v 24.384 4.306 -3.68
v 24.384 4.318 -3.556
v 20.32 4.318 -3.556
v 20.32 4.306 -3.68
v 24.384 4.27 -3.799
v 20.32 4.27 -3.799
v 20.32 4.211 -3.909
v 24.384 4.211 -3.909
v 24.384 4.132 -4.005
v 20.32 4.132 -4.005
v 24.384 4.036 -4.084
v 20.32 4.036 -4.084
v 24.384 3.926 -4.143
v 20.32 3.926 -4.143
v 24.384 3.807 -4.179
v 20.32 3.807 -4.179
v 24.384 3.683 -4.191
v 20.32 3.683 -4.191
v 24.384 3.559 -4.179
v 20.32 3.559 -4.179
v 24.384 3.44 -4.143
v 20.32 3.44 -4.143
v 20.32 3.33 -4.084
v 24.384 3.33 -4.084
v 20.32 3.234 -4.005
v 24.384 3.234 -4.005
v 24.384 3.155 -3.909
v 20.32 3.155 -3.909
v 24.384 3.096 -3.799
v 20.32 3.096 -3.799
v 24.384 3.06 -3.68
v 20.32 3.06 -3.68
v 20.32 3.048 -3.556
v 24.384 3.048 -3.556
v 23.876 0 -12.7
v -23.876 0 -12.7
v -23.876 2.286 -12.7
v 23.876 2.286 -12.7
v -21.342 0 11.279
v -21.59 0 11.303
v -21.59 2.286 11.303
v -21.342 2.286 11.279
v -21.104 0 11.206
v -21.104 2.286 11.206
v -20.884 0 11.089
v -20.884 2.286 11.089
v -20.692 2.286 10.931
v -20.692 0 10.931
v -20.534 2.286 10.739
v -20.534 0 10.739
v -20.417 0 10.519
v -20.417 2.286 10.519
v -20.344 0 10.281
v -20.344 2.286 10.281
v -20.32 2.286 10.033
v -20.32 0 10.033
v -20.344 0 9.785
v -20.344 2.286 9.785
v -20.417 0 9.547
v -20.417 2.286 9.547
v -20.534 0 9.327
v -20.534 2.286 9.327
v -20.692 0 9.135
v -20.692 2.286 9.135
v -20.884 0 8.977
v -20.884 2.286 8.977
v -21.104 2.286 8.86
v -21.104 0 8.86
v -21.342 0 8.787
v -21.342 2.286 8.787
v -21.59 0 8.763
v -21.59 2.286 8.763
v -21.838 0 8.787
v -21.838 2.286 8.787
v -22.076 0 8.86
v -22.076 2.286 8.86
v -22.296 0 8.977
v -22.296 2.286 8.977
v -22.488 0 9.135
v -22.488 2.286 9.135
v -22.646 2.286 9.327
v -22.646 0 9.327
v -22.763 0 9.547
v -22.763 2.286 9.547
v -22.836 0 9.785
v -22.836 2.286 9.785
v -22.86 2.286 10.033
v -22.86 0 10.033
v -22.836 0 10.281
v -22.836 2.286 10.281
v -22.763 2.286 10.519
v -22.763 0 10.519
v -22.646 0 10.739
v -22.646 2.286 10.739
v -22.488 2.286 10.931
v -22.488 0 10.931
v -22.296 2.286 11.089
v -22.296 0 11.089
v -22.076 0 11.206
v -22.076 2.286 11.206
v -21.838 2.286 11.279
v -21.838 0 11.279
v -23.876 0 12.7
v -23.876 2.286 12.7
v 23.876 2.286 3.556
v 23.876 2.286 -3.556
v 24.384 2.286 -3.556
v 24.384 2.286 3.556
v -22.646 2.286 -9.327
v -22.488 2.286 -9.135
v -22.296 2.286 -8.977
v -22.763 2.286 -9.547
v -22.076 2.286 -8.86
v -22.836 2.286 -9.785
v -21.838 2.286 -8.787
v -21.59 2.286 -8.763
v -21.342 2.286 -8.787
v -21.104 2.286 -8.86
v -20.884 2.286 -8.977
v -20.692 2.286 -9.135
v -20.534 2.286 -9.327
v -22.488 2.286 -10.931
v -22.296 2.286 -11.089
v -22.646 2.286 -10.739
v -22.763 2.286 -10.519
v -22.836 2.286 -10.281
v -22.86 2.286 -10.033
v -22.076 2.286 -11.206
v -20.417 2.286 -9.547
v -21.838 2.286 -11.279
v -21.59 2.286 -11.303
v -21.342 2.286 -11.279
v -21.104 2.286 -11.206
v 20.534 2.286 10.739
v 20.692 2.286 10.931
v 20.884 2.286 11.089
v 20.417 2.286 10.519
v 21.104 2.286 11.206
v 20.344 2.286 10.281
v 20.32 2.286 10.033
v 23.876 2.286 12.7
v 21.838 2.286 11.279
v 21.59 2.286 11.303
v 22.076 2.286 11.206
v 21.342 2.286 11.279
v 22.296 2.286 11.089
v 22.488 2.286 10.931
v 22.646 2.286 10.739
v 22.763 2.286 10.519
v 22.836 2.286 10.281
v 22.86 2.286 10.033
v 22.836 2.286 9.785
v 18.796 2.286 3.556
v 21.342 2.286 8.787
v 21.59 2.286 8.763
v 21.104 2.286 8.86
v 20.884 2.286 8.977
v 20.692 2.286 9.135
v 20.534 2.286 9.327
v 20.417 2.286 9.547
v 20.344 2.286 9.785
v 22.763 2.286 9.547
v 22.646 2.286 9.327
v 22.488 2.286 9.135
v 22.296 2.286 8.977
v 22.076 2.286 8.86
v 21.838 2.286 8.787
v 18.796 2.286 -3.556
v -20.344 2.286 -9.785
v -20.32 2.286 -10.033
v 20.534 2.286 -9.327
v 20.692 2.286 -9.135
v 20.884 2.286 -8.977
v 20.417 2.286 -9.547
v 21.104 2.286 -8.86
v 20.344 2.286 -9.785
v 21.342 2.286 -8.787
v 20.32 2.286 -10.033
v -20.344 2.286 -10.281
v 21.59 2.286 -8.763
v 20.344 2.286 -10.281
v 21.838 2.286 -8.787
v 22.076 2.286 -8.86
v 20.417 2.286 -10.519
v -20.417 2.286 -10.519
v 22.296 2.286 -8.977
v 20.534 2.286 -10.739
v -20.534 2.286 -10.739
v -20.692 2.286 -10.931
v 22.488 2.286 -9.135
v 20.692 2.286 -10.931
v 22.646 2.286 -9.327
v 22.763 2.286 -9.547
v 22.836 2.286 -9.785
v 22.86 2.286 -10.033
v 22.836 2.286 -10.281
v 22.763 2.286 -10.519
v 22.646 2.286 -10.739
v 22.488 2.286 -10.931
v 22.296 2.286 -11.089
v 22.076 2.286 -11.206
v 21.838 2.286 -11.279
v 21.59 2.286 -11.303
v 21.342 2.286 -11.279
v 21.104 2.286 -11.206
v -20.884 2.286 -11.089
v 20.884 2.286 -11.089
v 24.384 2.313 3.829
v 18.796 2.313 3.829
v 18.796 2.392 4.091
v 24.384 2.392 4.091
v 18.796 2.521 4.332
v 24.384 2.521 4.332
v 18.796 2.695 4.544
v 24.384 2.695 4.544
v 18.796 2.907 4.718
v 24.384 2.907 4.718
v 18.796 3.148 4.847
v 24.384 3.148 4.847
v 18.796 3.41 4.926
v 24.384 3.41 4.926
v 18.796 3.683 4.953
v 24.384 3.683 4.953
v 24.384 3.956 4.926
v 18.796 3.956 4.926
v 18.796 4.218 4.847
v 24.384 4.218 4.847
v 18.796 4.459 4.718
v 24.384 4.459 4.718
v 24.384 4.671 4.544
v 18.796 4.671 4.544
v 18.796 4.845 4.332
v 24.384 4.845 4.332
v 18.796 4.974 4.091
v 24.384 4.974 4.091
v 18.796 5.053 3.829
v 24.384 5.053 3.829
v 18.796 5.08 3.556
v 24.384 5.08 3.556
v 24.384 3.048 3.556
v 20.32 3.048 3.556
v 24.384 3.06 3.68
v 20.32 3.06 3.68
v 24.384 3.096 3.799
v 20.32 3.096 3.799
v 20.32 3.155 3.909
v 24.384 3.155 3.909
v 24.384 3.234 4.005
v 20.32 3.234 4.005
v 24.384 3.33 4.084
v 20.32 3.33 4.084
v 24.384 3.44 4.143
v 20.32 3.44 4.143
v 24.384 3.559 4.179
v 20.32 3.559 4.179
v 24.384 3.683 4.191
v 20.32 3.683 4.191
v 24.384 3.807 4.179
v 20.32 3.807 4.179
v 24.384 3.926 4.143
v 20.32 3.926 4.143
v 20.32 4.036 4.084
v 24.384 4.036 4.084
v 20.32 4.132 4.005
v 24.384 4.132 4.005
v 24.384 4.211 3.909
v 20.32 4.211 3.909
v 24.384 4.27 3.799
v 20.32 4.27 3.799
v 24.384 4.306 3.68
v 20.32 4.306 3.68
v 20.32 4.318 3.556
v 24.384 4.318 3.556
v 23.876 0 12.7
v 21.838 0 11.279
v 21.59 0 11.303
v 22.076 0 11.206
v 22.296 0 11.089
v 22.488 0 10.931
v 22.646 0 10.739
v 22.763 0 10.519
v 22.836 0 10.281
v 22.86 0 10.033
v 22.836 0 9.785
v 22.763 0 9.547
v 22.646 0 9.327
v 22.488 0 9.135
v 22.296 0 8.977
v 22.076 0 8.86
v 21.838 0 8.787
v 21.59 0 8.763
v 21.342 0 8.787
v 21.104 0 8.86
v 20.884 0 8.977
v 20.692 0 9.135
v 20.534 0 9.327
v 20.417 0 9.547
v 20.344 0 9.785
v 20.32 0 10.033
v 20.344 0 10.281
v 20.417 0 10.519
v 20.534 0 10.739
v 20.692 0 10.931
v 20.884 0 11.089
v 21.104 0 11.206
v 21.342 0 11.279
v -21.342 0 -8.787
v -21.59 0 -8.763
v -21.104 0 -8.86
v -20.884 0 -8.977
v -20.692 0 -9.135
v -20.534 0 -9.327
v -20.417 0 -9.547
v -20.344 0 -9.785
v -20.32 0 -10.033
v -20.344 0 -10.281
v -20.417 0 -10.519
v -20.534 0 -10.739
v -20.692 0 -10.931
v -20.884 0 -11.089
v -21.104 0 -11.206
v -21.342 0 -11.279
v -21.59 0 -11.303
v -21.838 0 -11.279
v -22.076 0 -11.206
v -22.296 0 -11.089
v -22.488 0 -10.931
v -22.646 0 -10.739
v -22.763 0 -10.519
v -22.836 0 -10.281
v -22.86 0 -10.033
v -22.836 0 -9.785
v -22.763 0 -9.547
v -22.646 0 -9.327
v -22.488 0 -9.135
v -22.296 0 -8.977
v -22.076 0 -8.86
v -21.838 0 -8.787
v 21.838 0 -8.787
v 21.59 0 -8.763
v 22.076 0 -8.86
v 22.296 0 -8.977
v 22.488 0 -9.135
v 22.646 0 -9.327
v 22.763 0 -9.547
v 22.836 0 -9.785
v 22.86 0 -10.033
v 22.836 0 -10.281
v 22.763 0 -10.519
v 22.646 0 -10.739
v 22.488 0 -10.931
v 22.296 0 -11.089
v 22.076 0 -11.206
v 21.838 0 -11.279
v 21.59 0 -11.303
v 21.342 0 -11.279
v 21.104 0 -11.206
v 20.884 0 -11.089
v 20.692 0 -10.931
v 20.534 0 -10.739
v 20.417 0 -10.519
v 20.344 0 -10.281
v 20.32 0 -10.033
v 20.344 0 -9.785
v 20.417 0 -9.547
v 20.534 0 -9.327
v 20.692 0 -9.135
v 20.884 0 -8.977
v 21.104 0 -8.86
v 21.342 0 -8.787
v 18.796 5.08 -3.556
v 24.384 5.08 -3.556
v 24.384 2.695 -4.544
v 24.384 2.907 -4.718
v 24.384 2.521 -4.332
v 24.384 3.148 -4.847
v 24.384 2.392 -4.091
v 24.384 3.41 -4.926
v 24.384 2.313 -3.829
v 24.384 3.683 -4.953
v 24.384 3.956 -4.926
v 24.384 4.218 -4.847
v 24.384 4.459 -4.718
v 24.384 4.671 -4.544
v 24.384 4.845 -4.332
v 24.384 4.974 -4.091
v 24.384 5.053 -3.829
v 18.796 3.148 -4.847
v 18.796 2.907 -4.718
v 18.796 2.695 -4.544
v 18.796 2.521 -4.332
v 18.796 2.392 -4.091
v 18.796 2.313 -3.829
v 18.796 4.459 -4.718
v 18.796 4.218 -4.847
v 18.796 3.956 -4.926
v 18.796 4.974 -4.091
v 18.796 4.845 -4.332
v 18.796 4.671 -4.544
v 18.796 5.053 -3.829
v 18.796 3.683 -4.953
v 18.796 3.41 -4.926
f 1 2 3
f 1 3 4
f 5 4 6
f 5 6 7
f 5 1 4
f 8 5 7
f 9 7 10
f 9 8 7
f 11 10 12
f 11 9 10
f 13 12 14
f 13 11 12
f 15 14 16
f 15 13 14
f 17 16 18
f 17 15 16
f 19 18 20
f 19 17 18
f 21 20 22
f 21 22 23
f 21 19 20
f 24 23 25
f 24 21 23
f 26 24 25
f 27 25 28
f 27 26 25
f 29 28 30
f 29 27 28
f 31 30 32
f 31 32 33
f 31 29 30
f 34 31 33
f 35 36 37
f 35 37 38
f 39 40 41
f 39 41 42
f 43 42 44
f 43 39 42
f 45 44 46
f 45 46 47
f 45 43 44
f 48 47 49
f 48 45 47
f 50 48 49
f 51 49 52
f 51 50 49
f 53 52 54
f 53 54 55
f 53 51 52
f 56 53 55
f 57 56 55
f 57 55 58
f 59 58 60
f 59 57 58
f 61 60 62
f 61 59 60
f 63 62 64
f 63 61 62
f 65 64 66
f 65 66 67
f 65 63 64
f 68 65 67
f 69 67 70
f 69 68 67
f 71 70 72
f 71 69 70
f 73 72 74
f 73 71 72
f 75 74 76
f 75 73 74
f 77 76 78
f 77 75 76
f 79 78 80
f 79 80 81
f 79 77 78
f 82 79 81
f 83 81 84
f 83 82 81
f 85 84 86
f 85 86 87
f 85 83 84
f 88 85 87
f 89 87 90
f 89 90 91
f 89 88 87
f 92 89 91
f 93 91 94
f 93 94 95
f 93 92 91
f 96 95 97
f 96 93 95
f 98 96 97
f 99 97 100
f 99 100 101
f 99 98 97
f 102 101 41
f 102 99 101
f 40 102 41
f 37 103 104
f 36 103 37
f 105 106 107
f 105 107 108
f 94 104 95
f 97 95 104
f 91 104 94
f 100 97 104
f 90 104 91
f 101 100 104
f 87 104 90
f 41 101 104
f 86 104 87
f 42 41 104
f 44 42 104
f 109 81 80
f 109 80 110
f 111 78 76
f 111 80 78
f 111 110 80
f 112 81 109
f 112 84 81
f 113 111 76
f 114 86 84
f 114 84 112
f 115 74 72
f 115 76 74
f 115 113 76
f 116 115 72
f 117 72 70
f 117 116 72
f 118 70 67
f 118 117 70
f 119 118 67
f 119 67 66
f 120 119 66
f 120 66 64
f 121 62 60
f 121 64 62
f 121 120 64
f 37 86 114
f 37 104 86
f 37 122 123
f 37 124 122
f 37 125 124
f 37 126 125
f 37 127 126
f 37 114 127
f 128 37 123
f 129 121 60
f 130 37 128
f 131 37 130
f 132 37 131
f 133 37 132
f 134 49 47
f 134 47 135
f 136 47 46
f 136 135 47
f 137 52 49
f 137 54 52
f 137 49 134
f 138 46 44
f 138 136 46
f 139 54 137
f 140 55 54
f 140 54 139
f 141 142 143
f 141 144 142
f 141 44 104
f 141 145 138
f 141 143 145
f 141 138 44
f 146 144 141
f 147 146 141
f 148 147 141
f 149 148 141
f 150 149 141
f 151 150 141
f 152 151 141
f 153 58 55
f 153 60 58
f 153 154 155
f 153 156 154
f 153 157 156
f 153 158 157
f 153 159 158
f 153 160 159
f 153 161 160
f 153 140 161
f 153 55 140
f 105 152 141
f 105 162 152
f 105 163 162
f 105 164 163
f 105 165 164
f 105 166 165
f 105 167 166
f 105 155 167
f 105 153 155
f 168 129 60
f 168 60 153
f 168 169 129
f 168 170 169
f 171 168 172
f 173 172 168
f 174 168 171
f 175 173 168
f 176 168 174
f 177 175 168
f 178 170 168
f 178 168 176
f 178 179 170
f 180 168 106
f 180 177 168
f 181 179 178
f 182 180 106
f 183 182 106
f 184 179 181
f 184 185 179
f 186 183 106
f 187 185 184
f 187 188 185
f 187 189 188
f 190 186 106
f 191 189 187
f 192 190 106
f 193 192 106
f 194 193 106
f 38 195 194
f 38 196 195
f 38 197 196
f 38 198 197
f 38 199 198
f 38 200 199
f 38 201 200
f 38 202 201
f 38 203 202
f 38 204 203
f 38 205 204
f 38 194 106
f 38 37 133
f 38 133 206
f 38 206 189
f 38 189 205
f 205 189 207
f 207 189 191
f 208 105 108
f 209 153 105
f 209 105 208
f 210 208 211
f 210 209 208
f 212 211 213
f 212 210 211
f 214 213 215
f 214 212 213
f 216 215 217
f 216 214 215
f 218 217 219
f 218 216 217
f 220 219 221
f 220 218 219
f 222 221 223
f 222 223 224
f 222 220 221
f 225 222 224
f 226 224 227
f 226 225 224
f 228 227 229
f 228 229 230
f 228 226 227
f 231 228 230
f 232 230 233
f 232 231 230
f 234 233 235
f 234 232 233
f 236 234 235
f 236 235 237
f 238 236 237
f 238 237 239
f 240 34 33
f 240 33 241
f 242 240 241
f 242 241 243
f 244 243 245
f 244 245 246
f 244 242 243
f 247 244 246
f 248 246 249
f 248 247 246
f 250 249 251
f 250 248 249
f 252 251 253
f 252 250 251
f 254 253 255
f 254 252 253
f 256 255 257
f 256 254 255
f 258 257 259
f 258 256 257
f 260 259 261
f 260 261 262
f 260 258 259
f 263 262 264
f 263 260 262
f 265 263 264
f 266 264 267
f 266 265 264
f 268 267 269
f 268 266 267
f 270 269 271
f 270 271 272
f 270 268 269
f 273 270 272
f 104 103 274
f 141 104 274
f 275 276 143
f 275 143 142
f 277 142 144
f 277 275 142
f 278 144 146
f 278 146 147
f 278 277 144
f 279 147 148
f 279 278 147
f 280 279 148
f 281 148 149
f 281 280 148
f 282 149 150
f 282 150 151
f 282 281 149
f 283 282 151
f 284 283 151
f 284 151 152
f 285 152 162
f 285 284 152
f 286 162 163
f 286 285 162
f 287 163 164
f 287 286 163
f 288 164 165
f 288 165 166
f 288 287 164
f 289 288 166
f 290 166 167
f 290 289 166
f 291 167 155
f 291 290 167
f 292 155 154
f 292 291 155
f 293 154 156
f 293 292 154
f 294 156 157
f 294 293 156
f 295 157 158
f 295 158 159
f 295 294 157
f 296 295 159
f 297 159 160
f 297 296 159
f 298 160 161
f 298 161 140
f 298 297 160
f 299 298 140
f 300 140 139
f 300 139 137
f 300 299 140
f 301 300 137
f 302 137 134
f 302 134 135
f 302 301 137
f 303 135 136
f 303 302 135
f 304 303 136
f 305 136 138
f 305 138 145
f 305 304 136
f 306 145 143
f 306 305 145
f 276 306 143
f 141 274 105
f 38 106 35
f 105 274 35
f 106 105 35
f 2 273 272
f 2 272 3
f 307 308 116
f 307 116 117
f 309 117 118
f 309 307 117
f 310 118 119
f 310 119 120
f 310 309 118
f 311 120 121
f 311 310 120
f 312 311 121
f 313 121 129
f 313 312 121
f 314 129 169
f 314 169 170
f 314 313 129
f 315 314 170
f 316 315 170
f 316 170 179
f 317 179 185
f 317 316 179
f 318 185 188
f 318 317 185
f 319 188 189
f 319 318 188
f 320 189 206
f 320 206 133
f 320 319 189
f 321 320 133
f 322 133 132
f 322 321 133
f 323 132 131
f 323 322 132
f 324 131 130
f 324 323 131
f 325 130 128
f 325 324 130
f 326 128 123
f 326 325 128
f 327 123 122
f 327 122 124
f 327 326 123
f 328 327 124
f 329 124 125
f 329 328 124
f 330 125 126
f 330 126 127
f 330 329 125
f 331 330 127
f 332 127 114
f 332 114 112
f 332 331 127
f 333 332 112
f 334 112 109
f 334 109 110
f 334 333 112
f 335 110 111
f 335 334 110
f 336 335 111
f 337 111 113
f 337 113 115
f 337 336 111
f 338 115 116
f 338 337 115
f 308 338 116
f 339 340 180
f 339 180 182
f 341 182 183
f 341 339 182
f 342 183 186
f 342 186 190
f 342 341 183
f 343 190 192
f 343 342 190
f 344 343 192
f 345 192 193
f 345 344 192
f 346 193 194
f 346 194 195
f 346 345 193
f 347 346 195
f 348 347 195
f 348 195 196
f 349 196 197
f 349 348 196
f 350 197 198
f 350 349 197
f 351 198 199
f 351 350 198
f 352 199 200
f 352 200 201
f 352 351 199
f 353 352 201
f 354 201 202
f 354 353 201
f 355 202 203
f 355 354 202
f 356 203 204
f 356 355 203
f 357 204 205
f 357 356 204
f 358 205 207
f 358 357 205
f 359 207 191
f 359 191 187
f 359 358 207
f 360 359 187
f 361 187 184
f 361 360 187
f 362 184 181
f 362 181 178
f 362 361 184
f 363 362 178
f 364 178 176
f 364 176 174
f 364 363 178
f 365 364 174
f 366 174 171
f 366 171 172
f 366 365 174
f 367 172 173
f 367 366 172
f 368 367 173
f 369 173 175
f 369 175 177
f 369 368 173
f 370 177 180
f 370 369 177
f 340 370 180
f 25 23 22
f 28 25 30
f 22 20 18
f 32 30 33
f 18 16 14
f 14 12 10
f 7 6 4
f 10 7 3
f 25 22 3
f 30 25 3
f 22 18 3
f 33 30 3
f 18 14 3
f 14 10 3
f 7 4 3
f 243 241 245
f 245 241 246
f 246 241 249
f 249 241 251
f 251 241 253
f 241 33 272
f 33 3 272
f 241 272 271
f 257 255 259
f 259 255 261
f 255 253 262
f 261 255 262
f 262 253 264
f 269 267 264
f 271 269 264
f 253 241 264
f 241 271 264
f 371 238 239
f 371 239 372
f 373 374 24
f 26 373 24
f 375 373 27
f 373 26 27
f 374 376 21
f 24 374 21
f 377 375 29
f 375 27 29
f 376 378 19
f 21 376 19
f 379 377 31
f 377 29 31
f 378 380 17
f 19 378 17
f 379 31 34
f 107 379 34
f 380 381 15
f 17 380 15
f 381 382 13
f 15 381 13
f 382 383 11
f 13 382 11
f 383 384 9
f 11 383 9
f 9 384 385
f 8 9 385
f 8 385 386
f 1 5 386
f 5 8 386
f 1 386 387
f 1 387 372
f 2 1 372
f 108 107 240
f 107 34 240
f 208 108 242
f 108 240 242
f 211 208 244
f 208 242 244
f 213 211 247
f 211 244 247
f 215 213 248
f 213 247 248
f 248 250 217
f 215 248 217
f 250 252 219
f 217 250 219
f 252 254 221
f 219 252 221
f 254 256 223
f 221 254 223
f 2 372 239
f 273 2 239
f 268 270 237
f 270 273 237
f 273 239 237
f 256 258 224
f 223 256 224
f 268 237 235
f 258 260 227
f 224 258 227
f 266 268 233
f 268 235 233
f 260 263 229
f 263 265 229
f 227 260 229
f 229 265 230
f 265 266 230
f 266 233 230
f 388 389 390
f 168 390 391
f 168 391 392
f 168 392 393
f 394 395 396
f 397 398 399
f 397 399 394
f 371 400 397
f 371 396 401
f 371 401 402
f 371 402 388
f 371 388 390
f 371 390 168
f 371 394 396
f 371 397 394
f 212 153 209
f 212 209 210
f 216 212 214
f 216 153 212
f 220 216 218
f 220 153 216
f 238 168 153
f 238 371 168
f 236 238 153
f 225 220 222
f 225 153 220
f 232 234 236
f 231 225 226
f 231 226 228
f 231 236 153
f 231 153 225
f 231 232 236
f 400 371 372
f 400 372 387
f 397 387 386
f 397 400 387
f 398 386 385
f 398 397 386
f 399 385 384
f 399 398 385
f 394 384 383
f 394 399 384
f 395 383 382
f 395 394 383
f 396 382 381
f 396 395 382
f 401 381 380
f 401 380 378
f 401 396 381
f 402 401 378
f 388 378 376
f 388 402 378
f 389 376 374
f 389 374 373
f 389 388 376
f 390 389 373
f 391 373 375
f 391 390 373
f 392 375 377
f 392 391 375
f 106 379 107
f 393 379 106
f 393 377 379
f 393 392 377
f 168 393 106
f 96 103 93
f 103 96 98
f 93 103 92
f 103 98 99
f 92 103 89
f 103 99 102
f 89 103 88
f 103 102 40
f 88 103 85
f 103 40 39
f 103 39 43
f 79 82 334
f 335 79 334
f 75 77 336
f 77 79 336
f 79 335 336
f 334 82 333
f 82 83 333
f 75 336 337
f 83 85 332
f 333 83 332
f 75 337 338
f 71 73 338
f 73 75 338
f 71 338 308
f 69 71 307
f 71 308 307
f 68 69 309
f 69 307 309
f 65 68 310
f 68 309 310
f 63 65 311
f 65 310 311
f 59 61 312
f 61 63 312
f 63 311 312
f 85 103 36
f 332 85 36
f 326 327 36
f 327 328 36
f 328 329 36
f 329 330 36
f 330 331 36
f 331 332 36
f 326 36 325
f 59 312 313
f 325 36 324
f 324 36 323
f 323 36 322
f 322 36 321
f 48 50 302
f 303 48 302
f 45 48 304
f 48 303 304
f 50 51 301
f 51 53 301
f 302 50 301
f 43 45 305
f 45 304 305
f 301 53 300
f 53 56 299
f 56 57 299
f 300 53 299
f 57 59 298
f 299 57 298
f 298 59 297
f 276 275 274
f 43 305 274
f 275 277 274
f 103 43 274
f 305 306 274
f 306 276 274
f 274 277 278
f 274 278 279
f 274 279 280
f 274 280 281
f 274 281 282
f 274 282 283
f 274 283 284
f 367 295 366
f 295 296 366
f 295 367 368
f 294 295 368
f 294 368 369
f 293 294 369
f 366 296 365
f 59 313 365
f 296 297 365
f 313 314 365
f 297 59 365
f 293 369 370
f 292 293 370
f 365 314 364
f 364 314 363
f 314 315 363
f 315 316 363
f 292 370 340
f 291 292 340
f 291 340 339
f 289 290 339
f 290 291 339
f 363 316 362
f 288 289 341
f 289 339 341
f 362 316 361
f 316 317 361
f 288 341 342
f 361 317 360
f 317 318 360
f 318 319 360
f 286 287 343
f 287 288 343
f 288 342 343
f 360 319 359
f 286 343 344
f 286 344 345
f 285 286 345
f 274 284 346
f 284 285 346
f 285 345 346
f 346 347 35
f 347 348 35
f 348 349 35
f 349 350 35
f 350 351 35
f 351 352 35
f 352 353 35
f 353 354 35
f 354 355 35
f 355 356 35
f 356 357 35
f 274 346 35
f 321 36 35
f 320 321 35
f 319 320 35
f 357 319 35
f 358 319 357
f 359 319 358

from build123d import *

# Parameters (mm, degrees)
SKETCH1_W                = 47.752
SKETCH1_H                = 25.4
SKETCH1_R                = 1.27
BOSS_EXTRUDE1_DEPTH      = 2.286
BOSS_EXTRUDE2_DEPTH      = 0.508
BOSS_EXTRUDE2_DEPTH_BACK = 5.08
CUT_EXTRUDE1_DEPTH       = 4.064


with BuildPart() as part:
    # Sketch1 → Boss-Extrude1 (new body)
    with BuildSketch(Plane(origin=(0, 0, 0), x_dir=(1, 0, 0), z_dir=(0, 1, 0))):
        Rectangle(SKETCH1_W, SKETCH1_H)
        with Locations(Location((-21.59, 10.033, 0), (0, 0, 270))):
            Circle(SKETCH1_R, mode=Mode.SUBTRACT)
        with Locations(Location((21.59, 10.033, 0), (0, 0, 270))):
            Circle(SKETCH1_R, mode=Mode.SUBTRACT)
        with Locations(Location((-21.59, -10.033, 0), (0, 0, 270))):
            Circle(SKETCH1_R, mode=Mode.SUBTRACT)
        with Locations(Location((21.59, -10.033, 0), (0, 0, 270))):
            Circle(SKETCH1_R, mode=Mode.SUBTRACT)
    extrude(amount=BOSS_EXTRUDE1_DEPTH)

    # Sketch2 → Boss-Extrude2 (add, two sides: drawn at the far end of the back side and taken through both)
    with BuildSketch(Plane(origin=(23.876, 0, 0), x_dir=(0, 0, -1), z_dir=(1, 0, 0)).offset(-BOSS_EXTRUDE2_DEPTH_BACK)):
        with BuildLine():
            Line((-3.556, 5.08), (3.556, 5.08))
            ThreePointArc((3.556, 5.08), (4.953, 3.683), (3.556, 2.286))
            Line((3.556, 2.286), (-3.556, 2.286))
            ThreePointArc((-3.556, 2.286), (-4.953, 3.683), (-3.556, 5.08))
        make_face()
    extrude(amount=BOSS_EXTRUDE2_DEPTH + BOSS_EXTRUDE2_DEPTH_BACK)

    # Sketch3 → Cut-Extrude1 (cut)
    with BuildSketch(Plane(origin=(24.384, 0, 0), x_dir=(0, 0, -1), z_dir=(1, 0, 0))):
        with BuildLine():
            Line((-3.556, 4.318), (3.556, 4.318))
            ThreePointArc((3.556, 4.318), (4.191, 3.683), (3.556, 3.048))
            Line((3.556, 3.048), (-3.556, 3.048))
            ThreePointArc((-3.556, 3.048), (-4.191, 3.683), (-3.556, 4.318))
        make_face()
    extrude(amount=-CUT_EXTRUDE1_DEPTH, mode=Mode.SUBTRACT)


solid = part.part
